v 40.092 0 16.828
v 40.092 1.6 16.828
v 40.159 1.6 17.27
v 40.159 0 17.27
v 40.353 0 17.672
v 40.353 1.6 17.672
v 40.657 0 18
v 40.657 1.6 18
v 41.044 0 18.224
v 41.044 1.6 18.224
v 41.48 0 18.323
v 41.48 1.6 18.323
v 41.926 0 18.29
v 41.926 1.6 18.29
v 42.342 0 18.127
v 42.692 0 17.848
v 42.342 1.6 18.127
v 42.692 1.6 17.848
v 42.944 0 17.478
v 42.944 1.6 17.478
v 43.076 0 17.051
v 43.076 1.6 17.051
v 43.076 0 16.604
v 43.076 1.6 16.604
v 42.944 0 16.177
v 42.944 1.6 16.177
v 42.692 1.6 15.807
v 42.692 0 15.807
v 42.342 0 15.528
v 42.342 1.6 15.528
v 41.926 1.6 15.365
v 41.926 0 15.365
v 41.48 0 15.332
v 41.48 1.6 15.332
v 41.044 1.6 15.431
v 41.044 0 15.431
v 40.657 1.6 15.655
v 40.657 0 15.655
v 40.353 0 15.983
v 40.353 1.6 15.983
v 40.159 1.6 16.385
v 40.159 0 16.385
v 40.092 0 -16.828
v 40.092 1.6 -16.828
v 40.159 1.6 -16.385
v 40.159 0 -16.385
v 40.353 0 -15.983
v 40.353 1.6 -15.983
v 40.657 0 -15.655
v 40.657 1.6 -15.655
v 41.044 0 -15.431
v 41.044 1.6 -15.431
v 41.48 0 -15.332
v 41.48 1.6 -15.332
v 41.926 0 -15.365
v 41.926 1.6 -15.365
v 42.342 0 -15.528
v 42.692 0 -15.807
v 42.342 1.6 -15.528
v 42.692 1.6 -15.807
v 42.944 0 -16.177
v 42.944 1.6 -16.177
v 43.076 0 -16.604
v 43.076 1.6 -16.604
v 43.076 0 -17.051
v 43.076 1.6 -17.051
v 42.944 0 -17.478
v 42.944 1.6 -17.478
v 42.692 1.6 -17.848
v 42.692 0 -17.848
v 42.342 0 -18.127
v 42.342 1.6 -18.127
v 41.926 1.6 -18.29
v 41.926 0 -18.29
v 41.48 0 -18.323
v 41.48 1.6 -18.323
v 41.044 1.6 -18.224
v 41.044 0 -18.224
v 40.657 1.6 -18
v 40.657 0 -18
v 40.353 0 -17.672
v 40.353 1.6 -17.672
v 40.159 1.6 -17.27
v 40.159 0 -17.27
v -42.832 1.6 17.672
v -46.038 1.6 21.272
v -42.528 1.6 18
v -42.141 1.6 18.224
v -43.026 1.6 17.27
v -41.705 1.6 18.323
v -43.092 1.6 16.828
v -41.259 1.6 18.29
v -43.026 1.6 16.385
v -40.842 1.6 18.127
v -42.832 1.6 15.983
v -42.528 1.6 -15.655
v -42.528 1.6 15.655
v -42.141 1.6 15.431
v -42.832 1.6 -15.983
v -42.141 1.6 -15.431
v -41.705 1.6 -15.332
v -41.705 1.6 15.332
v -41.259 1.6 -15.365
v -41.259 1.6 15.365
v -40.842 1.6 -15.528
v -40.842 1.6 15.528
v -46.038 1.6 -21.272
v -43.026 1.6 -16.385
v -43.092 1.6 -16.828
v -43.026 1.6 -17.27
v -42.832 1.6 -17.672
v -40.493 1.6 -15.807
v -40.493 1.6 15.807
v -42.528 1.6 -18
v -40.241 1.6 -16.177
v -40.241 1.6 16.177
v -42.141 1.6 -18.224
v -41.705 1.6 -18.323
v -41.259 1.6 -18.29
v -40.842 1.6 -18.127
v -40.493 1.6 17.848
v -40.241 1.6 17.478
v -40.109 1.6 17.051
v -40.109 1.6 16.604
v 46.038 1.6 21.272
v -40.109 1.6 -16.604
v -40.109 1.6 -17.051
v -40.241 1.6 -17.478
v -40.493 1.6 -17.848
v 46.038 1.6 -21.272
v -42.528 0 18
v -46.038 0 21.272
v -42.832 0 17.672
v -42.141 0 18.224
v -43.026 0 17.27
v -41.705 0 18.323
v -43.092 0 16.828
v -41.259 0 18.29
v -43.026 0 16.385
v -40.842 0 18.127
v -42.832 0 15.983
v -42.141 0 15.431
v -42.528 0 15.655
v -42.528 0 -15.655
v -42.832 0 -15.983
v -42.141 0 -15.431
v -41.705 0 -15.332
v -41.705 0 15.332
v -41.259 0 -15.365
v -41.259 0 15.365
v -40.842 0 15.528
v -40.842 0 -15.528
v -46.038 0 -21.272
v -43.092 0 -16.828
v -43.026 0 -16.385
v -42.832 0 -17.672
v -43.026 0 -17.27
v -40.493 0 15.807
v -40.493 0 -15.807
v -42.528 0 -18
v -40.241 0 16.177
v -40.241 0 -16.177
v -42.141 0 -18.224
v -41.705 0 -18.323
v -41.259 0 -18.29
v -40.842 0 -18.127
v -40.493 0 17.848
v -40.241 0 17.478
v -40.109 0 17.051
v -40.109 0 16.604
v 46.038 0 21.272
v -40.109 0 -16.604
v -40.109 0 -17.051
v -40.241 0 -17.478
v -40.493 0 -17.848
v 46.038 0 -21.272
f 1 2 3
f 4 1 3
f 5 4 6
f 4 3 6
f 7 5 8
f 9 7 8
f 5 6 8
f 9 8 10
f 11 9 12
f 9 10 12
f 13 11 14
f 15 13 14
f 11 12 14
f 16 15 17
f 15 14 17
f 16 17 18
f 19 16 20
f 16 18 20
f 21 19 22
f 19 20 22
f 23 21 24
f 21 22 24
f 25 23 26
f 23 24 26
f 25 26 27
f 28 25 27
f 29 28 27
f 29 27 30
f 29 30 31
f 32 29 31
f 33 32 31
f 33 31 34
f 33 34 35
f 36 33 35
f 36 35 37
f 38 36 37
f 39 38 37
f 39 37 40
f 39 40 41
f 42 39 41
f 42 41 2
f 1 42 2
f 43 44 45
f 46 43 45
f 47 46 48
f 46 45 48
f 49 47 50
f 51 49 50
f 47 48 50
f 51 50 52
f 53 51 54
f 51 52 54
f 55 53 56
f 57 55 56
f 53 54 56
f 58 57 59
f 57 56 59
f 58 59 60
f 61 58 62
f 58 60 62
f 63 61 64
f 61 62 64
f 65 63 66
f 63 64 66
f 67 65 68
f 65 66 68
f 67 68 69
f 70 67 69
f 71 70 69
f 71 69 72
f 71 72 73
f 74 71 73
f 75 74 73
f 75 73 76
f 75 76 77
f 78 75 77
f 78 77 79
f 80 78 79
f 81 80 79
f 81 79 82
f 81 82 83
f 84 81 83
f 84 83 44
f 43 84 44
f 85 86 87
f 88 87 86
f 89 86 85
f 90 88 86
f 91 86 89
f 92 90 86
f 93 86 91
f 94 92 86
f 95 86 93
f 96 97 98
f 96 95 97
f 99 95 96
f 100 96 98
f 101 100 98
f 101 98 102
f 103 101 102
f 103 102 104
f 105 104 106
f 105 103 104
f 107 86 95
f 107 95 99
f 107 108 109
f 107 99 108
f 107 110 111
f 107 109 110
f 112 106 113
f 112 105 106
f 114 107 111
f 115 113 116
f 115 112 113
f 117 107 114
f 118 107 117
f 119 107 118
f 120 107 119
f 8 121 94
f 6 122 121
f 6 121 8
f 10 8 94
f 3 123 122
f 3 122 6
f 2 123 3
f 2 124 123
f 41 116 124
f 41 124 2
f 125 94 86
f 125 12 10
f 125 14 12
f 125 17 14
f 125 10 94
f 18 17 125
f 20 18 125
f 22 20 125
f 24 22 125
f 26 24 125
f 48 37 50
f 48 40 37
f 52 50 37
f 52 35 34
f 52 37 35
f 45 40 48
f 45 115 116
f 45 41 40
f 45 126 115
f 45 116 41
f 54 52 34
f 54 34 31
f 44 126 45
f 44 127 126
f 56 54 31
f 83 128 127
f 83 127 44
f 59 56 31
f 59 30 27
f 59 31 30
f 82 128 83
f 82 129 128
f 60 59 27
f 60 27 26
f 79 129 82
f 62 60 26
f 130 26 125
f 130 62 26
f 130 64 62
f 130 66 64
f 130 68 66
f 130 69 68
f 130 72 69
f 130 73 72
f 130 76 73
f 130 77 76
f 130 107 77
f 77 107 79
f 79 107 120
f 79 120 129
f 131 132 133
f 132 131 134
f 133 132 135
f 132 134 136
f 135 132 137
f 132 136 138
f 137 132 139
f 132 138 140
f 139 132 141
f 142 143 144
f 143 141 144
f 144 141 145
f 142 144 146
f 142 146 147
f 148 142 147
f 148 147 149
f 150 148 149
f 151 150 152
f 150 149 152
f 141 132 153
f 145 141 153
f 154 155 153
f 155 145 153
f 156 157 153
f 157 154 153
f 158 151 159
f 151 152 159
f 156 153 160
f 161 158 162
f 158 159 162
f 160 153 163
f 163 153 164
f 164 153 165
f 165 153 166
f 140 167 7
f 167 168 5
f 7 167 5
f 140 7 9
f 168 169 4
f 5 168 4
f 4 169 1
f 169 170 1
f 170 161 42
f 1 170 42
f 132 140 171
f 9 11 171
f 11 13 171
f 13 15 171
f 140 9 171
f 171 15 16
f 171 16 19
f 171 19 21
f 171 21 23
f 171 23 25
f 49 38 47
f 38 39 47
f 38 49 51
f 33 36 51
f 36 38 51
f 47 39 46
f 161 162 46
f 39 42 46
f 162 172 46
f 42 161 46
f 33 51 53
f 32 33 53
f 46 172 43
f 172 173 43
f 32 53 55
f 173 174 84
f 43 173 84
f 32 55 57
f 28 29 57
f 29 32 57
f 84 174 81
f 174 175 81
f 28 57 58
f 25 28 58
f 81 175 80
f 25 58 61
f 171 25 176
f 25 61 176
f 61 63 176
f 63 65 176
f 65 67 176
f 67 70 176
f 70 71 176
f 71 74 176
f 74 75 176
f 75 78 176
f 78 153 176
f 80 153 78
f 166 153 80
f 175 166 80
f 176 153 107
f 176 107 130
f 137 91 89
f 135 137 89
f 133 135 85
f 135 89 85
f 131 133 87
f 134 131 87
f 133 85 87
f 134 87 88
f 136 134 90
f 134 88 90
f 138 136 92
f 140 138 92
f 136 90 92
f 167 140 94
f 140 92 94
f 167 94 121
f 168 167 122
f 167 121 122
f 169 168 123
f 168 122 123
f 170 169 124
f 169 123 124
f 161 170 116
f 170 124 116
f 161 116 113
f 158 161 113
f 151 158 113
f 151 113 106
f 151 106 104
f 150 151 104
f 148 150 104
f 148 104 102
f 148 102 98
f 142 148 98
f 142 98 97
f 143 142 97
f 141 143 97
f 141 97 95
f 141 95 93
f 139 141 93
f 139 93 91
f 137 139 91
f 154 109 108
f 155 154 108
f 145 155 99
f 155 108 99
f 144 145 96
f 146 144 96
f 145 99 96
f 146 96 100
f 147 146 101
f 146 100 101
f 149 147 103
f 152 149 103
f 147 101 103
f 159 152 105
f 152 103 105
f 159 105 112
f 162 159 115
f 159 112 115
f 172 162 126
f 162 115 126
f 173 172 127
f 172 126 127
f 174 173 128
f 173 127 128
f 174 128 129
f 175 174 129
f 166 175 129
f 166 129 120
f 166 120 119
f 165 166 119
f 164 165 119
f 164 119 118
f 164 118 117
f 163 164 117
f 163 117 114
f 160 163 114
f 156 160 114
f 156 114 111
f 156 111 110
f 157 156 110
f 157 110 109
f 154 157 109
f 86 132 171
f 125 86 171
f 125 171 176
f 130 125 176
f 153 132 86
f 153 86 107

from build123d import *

# Parameters (mm, degrees)
SKETCH2_W             = 92.075
SKETCH2_H             = 42.545
PCBBASE_DEPTH         = 1.6
F_3_0MM_DOWEL_HOLE2_D = 3


with BuildPart() as part:
    # Sketch2 → PCBBase (new body)
    with BuildSketch(Plane(origin=(0, 0, 0), x_dir=(1, 0, 0), z_dir=(0, 1, 0))):
        Rectangle(SKETCH2_W, SKETCH2_H)
    extrude(amount=PCBBASE_DEPTH)

    # Ø3.0mm Dowel Hole2 (through all)
    with Locations(Plane.XZ):
        with Locations((-41.5925, -16.8275), (-41.5925, 16.8275), (41.5925, 16.8275), (41.5925, -16.8275)):
            Hole(F_3_0MM_DOWEL_HOLE2_D / 2)


solid = part.part
